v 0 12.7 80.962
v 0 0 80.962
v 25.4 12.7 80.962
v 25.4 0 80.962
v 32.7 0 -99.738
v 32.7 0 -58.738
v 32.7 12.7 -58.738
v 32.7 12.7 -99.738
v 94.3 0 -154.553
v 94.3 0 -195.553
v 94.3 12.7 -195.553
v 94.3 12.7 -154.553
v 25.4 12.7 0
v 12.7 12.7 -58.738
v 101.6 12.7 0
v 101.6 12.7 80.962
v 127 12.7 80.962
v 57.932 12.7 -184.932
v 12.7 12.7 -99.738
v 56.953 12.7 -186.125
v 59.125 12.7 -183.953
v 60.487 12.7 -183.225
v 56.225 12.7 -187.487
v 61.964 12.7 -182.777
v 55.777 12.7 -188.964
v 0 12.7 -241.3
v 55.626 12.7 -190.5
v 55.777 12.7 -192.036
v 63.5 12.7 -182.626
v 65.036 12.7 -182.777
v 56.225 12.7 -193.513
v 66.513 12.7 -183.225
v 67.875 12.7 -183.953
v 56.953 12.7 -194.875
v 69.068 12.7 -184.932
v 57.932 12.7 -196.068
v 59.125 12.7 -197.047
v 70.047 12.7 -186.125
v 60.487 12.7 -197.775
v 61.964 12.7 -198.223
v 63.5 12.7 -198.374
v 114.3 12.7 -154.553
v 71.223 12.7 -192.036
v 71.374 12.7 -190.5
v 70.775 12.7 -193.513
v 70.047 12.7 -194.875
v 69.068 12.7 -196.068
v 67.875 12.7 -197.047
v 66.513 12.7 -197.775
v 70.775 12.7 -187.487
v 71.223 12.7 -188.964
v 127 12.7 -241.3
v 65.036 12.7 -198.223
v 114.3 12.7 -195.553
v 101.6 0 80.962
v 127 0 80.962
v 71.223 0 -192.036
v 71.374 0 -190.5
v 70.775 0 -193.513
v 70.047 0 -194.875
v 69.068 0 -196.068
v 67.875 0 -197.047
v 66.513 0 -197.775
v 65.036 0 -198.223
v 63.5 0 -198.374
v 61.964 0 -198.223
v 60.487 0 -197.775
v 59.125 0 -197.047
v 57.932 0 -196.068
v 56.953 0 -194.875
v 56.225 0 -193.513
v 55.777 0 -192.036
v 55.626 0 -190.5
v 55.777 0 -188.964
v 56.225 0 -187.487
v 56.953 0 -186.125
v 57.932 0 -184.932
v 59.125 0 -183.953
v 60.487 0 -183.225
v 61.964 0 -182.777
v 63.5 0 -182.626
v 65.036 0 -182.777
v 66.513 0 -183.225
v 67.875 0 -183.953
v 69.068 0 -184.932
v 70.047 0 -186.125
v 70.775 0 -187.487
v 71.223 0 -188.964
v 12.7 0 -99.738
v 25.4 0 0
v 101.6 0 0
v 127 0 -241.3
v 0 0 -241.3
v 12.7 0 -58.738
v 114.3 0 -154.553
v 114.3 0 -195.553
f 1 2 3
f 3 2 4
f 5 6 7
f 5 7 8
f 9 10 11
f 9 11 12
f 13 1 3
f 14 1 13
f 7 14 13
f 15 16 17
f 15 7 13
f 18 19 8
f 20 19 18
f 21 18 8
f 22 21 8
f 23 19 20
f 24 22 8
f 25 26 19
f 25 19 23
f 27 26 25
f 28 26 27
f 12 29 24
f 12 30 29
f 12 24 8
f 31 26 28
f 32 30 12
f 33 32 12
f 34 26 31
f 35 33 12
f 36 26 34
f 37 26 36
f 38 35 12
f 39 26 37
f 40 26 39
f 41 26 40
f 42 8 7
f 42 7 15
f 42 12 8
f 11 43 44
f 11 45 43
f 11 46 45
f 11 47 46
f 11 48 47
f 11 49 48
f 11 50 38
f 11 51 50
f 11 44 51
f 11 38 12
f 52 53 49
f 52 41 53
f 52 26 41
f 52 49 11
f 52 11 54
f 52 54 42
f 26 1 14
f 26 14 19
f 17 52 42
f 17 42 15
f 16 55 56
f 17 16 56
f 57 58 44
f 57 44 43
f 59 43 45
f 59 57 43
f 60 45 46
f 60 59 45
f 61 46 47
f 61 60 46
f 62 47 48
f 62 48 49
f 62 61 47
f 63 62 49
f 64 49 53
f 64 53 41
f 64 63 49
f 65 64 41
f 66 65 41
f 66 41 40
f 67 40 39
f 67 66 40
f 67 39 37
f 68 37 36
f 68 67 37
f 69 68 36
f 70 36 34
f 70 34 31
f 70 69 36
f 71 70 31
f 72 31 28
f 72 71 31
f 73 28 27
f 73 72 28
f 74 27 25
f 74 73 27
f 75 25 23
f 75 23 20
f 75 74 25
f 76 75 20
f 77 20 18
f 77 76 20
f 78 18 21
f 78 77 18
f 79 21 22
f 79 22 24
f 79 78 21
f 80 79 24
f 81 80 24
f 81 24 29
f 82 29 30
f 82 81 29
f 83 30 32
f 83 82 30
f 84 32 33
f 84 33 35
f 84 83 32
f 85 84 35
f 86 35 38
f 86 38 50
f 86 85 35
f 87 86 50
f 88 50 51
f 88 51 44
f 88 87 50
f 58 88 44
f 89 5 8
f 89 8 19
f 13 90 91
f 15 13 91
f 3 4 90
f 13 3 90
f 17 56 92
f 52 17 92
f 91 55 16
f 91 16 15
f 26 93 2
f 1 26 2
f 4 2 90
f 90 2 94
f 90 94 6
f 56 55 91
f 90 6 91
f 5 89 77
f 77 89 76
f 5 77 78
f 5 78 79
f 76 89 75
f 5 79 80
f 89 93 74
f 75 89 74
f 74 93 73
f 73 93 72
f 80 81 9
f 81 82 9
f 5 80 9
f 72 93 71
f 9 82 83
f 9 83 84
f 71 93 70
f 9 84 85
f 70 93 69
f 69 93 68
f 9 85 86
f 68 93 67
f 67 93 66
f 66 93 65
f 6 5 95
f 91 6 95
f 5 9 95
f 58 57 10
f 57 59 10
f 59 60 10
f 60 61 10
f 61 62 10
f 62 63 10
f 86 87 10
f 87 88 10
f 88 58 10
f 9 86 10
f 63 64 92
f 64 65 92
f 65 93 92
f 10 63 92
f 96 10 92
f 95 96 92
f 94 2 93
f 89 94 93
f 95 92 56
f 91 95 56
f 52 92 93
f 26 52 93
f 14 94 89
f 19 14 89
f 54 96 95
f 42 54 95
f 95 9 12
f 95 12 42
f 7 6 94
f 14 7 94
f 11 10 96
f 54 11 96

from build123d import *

# Parameters (mm, degrees)
SKETCH1_R           = 7.874
SKETCH1_W           = 25.4
SKETCH1_H           = 80.9625
BOSS_EXTRUDE1_DEPTH = 12.7
SKETCH2_W           = 20
SKETCH2_H           = 41
CUT_EXTRUDE1_DEPTH  = 13.7
SKETCH3_W           = 20
SKETCH3_H           = 41
CUT_EXTRUDE2_DEPTH  = 13.7


with BuildPart() as part:
    # Sketch1 → Boss-Extrude1 (new body)
    with BuildSketch(Plane(origin=(0, 0, 0), x_dir=(1, 0, 0), z_dir=(0, 1, 0))):
        Polygon((0, 241.3), (0, 0), (25.4, 0), (101.6, 0), (127, 0), (127, 241.3), align=None)
        with Locations((63.5, 190.5)):
            Circle(SKETCH1_R, mode=Mode.SUBTRACT)
        with Locations((12.7, -40.48125)):
            Rectangle(SKETCH1_W, SKETCH1_H)
        with Locations((114.3, -40.48125)):
            Rectangle(SKETCH1_W, SKETCH1_H)
    extrude(amount=BOSS_EXTRUDE1_DEPTH)

    # Sketch2 → Cut-Extrude1 (cut, through all)
    with BuildSketch(Plane.XZ):
        with Locations((104.3, -175.05319538)):
            Rectangle(SKETCH2_W, SKETCH2_H)
    extrude(amount=-CUT_EXTRUDE1_DEPTH, mode=Mode.SUBTRACT)

    # Sketch3 → Cut-Extrude2 (cut, through all)
    with BuildSketch(Plane(origin=(0, 0, 0), x_dir=(-1, 0, 0), z_dir=(0, -1, 0))):
        with Locations((-22.7, 79.2375)):
            Rectangle(SKETCH3_W, SKETCH3_H)
    extrude(amount=-CUT_EXTRUDE2_DEPTH, mode=Mode.SUBTRACT)


solid = part.part
